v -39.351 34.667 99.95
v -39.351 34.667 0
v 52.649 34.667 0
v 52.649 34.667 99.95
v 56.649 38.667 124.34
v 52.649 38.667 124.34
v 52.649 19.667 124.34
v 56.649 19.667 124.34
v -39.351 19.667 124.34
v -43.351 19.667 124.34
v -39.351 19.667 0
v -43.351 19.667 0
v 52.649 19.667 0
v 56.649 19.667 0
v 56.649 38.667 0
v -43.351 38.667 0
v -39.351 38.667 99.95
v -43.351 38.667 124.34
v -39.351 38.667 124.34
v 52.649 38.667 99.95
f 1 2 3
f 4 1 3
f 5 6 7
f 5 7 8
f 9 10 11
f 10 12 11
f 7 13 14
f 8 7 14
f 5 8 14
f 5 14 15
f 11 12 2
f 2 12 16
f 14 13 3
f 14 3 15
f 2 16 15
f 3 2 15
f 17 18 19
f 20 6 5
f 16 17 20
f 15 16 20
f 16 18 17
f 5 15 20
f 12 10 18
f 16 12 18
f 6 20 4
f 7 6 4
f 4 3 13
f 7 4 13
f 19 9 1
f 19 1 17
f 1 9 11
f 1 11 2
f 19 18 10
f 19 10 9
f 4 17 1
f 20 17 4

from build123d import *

# Parameters (mm, degrees)
BOSS_EXTRUDE1_DEPTH = 99.95
SKETCH2_W           = 4
SKETCH2_H           = 19
BOSS_EXTRUDE2_DEPTH = 24.39


with BuildPart() as part:
    # Sketch1 → Boss-Extrude1 (new body)
    with BuildSketch(Plane.XY):
        Polygon((52.648648649, 19.666666667), (56.648648649, 19.666666667), (56.648648649, 38.666666667), (-43.351351351, 38.666666667), (-43.351351351, 19.666666667), (-39.351351351, 19.666666667), (-39.351351351, 34.666666667), (52.648648649, 34.666666667), align=None)
    extrude(amount=BOSS_EXTRUDE1_DEPTH)

    # Sketch2 → Boss-Extrude2 (add)
    with BuildSketch(Plane.XY.offset(99.95)):
        with Locations((-41.351351351, 29.166666667)):
            Rectangle(SKETCH2_W, SKETCH2_H)
        with Locations((54.648648649, 29.166666667)):
            Rectangle(SKETCH2_W, SKETCH2_H)
    extrude(amount=BOSS_EXTRUDE2_DEPTH)


solid = part.part
